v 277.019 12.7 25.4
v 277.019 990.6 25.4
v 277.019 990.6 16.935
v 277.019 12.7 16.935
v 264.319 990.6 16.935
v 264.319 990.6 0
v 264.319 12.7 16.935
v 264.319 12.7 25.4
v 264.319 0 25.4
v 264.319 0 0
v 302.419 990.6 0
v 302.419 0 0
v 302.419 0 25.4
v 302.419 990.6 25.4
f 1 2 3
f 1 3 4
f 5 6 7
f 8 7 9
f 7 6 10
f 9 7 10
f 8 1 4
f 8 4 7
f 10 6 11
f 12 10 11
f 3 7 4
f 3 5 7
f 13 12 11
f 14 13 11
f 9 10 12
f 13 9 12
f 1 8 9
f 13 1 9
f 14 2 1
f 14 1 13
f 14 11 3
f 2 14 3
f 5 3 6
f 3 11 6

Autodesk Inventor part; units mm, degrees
ref_plane "YZ Plane" through (0, 0, 0) normal (1, 0, 0) x (0, 1, 0)
ref_plane "XZ Plane" through (0, 0, 0) normal (0, 1, 0) x (-1, 0, 0)
ref_plane "XY Plane" through (0, 0, 0) normal (0, 0, 1) x (1, 0, 0)
ref_plane "Work Plane1" through (0, 0, 0) normal (0, 0, 1) x (1, 0, 0)
sketch "Sketch1" plane through (0, 0, 0) normal (0, 0, 1) x (1, 0, 0)
  line L0 (302.4187, 990.6) -> (264.3187, 990.6)
  line L1 (264.3187, 990.6) -> (264.3188, 0)
  line L2 (264.3188, 0) -> (302.4188, 0)
  line L3 (302.4188, 0) -> (302.4187, 990.6)
  point P0 (0, 0)
  dimension "d0" = 990.6
  dimension "d2" = 38.1
extrude "Extrusion1" add sketch "Sketch1" along normal blind 25.4
sketch "Sketch3" plane through (0, 0, 25.4) normal (0, 0, 1) x (1, 0, 0)
  line L0 (264.3187, 990.6) -> (277.0187, 990.6)
  line L1 (277.0187, 990.6) -> (277.0187, 12.7)
  line L2 (277.0187, 12.7) -> (264.3187, 12.7)
  line L3 (264.3187, 12.7) -> (264.3187, 990.6)
  point P0 (0, 0)
  dimension "d10" = 12.7
  dimension "d11" = 977.9
extrude "Extrusion3" cut sketch "Sketch3" against normal blind 8.4646
equation "\"d0\" = 0.5 * signH"
equation "\"d2\" = borderW"
equation "\"d3\" = borderH"
equation "\"d10\" = panelLap"
equation "\"d11\" = 0.5 * signH - panelLap"
equation "\"d12\" = panelH + velcroH + panelHClear"
equation "\"signH\" = 1981.2"
equation "\"borderW\" = 38.1"
equation "\"borderH\" = 25.4"
equation "\"velcroH\" = 2.54"
equation "\"panelH\" = 5.1308"
equation "\"panelHClear\" = 0.79375"
equation "\"panelLap\" = 12.7"
properties part number "SideborderInverse"
